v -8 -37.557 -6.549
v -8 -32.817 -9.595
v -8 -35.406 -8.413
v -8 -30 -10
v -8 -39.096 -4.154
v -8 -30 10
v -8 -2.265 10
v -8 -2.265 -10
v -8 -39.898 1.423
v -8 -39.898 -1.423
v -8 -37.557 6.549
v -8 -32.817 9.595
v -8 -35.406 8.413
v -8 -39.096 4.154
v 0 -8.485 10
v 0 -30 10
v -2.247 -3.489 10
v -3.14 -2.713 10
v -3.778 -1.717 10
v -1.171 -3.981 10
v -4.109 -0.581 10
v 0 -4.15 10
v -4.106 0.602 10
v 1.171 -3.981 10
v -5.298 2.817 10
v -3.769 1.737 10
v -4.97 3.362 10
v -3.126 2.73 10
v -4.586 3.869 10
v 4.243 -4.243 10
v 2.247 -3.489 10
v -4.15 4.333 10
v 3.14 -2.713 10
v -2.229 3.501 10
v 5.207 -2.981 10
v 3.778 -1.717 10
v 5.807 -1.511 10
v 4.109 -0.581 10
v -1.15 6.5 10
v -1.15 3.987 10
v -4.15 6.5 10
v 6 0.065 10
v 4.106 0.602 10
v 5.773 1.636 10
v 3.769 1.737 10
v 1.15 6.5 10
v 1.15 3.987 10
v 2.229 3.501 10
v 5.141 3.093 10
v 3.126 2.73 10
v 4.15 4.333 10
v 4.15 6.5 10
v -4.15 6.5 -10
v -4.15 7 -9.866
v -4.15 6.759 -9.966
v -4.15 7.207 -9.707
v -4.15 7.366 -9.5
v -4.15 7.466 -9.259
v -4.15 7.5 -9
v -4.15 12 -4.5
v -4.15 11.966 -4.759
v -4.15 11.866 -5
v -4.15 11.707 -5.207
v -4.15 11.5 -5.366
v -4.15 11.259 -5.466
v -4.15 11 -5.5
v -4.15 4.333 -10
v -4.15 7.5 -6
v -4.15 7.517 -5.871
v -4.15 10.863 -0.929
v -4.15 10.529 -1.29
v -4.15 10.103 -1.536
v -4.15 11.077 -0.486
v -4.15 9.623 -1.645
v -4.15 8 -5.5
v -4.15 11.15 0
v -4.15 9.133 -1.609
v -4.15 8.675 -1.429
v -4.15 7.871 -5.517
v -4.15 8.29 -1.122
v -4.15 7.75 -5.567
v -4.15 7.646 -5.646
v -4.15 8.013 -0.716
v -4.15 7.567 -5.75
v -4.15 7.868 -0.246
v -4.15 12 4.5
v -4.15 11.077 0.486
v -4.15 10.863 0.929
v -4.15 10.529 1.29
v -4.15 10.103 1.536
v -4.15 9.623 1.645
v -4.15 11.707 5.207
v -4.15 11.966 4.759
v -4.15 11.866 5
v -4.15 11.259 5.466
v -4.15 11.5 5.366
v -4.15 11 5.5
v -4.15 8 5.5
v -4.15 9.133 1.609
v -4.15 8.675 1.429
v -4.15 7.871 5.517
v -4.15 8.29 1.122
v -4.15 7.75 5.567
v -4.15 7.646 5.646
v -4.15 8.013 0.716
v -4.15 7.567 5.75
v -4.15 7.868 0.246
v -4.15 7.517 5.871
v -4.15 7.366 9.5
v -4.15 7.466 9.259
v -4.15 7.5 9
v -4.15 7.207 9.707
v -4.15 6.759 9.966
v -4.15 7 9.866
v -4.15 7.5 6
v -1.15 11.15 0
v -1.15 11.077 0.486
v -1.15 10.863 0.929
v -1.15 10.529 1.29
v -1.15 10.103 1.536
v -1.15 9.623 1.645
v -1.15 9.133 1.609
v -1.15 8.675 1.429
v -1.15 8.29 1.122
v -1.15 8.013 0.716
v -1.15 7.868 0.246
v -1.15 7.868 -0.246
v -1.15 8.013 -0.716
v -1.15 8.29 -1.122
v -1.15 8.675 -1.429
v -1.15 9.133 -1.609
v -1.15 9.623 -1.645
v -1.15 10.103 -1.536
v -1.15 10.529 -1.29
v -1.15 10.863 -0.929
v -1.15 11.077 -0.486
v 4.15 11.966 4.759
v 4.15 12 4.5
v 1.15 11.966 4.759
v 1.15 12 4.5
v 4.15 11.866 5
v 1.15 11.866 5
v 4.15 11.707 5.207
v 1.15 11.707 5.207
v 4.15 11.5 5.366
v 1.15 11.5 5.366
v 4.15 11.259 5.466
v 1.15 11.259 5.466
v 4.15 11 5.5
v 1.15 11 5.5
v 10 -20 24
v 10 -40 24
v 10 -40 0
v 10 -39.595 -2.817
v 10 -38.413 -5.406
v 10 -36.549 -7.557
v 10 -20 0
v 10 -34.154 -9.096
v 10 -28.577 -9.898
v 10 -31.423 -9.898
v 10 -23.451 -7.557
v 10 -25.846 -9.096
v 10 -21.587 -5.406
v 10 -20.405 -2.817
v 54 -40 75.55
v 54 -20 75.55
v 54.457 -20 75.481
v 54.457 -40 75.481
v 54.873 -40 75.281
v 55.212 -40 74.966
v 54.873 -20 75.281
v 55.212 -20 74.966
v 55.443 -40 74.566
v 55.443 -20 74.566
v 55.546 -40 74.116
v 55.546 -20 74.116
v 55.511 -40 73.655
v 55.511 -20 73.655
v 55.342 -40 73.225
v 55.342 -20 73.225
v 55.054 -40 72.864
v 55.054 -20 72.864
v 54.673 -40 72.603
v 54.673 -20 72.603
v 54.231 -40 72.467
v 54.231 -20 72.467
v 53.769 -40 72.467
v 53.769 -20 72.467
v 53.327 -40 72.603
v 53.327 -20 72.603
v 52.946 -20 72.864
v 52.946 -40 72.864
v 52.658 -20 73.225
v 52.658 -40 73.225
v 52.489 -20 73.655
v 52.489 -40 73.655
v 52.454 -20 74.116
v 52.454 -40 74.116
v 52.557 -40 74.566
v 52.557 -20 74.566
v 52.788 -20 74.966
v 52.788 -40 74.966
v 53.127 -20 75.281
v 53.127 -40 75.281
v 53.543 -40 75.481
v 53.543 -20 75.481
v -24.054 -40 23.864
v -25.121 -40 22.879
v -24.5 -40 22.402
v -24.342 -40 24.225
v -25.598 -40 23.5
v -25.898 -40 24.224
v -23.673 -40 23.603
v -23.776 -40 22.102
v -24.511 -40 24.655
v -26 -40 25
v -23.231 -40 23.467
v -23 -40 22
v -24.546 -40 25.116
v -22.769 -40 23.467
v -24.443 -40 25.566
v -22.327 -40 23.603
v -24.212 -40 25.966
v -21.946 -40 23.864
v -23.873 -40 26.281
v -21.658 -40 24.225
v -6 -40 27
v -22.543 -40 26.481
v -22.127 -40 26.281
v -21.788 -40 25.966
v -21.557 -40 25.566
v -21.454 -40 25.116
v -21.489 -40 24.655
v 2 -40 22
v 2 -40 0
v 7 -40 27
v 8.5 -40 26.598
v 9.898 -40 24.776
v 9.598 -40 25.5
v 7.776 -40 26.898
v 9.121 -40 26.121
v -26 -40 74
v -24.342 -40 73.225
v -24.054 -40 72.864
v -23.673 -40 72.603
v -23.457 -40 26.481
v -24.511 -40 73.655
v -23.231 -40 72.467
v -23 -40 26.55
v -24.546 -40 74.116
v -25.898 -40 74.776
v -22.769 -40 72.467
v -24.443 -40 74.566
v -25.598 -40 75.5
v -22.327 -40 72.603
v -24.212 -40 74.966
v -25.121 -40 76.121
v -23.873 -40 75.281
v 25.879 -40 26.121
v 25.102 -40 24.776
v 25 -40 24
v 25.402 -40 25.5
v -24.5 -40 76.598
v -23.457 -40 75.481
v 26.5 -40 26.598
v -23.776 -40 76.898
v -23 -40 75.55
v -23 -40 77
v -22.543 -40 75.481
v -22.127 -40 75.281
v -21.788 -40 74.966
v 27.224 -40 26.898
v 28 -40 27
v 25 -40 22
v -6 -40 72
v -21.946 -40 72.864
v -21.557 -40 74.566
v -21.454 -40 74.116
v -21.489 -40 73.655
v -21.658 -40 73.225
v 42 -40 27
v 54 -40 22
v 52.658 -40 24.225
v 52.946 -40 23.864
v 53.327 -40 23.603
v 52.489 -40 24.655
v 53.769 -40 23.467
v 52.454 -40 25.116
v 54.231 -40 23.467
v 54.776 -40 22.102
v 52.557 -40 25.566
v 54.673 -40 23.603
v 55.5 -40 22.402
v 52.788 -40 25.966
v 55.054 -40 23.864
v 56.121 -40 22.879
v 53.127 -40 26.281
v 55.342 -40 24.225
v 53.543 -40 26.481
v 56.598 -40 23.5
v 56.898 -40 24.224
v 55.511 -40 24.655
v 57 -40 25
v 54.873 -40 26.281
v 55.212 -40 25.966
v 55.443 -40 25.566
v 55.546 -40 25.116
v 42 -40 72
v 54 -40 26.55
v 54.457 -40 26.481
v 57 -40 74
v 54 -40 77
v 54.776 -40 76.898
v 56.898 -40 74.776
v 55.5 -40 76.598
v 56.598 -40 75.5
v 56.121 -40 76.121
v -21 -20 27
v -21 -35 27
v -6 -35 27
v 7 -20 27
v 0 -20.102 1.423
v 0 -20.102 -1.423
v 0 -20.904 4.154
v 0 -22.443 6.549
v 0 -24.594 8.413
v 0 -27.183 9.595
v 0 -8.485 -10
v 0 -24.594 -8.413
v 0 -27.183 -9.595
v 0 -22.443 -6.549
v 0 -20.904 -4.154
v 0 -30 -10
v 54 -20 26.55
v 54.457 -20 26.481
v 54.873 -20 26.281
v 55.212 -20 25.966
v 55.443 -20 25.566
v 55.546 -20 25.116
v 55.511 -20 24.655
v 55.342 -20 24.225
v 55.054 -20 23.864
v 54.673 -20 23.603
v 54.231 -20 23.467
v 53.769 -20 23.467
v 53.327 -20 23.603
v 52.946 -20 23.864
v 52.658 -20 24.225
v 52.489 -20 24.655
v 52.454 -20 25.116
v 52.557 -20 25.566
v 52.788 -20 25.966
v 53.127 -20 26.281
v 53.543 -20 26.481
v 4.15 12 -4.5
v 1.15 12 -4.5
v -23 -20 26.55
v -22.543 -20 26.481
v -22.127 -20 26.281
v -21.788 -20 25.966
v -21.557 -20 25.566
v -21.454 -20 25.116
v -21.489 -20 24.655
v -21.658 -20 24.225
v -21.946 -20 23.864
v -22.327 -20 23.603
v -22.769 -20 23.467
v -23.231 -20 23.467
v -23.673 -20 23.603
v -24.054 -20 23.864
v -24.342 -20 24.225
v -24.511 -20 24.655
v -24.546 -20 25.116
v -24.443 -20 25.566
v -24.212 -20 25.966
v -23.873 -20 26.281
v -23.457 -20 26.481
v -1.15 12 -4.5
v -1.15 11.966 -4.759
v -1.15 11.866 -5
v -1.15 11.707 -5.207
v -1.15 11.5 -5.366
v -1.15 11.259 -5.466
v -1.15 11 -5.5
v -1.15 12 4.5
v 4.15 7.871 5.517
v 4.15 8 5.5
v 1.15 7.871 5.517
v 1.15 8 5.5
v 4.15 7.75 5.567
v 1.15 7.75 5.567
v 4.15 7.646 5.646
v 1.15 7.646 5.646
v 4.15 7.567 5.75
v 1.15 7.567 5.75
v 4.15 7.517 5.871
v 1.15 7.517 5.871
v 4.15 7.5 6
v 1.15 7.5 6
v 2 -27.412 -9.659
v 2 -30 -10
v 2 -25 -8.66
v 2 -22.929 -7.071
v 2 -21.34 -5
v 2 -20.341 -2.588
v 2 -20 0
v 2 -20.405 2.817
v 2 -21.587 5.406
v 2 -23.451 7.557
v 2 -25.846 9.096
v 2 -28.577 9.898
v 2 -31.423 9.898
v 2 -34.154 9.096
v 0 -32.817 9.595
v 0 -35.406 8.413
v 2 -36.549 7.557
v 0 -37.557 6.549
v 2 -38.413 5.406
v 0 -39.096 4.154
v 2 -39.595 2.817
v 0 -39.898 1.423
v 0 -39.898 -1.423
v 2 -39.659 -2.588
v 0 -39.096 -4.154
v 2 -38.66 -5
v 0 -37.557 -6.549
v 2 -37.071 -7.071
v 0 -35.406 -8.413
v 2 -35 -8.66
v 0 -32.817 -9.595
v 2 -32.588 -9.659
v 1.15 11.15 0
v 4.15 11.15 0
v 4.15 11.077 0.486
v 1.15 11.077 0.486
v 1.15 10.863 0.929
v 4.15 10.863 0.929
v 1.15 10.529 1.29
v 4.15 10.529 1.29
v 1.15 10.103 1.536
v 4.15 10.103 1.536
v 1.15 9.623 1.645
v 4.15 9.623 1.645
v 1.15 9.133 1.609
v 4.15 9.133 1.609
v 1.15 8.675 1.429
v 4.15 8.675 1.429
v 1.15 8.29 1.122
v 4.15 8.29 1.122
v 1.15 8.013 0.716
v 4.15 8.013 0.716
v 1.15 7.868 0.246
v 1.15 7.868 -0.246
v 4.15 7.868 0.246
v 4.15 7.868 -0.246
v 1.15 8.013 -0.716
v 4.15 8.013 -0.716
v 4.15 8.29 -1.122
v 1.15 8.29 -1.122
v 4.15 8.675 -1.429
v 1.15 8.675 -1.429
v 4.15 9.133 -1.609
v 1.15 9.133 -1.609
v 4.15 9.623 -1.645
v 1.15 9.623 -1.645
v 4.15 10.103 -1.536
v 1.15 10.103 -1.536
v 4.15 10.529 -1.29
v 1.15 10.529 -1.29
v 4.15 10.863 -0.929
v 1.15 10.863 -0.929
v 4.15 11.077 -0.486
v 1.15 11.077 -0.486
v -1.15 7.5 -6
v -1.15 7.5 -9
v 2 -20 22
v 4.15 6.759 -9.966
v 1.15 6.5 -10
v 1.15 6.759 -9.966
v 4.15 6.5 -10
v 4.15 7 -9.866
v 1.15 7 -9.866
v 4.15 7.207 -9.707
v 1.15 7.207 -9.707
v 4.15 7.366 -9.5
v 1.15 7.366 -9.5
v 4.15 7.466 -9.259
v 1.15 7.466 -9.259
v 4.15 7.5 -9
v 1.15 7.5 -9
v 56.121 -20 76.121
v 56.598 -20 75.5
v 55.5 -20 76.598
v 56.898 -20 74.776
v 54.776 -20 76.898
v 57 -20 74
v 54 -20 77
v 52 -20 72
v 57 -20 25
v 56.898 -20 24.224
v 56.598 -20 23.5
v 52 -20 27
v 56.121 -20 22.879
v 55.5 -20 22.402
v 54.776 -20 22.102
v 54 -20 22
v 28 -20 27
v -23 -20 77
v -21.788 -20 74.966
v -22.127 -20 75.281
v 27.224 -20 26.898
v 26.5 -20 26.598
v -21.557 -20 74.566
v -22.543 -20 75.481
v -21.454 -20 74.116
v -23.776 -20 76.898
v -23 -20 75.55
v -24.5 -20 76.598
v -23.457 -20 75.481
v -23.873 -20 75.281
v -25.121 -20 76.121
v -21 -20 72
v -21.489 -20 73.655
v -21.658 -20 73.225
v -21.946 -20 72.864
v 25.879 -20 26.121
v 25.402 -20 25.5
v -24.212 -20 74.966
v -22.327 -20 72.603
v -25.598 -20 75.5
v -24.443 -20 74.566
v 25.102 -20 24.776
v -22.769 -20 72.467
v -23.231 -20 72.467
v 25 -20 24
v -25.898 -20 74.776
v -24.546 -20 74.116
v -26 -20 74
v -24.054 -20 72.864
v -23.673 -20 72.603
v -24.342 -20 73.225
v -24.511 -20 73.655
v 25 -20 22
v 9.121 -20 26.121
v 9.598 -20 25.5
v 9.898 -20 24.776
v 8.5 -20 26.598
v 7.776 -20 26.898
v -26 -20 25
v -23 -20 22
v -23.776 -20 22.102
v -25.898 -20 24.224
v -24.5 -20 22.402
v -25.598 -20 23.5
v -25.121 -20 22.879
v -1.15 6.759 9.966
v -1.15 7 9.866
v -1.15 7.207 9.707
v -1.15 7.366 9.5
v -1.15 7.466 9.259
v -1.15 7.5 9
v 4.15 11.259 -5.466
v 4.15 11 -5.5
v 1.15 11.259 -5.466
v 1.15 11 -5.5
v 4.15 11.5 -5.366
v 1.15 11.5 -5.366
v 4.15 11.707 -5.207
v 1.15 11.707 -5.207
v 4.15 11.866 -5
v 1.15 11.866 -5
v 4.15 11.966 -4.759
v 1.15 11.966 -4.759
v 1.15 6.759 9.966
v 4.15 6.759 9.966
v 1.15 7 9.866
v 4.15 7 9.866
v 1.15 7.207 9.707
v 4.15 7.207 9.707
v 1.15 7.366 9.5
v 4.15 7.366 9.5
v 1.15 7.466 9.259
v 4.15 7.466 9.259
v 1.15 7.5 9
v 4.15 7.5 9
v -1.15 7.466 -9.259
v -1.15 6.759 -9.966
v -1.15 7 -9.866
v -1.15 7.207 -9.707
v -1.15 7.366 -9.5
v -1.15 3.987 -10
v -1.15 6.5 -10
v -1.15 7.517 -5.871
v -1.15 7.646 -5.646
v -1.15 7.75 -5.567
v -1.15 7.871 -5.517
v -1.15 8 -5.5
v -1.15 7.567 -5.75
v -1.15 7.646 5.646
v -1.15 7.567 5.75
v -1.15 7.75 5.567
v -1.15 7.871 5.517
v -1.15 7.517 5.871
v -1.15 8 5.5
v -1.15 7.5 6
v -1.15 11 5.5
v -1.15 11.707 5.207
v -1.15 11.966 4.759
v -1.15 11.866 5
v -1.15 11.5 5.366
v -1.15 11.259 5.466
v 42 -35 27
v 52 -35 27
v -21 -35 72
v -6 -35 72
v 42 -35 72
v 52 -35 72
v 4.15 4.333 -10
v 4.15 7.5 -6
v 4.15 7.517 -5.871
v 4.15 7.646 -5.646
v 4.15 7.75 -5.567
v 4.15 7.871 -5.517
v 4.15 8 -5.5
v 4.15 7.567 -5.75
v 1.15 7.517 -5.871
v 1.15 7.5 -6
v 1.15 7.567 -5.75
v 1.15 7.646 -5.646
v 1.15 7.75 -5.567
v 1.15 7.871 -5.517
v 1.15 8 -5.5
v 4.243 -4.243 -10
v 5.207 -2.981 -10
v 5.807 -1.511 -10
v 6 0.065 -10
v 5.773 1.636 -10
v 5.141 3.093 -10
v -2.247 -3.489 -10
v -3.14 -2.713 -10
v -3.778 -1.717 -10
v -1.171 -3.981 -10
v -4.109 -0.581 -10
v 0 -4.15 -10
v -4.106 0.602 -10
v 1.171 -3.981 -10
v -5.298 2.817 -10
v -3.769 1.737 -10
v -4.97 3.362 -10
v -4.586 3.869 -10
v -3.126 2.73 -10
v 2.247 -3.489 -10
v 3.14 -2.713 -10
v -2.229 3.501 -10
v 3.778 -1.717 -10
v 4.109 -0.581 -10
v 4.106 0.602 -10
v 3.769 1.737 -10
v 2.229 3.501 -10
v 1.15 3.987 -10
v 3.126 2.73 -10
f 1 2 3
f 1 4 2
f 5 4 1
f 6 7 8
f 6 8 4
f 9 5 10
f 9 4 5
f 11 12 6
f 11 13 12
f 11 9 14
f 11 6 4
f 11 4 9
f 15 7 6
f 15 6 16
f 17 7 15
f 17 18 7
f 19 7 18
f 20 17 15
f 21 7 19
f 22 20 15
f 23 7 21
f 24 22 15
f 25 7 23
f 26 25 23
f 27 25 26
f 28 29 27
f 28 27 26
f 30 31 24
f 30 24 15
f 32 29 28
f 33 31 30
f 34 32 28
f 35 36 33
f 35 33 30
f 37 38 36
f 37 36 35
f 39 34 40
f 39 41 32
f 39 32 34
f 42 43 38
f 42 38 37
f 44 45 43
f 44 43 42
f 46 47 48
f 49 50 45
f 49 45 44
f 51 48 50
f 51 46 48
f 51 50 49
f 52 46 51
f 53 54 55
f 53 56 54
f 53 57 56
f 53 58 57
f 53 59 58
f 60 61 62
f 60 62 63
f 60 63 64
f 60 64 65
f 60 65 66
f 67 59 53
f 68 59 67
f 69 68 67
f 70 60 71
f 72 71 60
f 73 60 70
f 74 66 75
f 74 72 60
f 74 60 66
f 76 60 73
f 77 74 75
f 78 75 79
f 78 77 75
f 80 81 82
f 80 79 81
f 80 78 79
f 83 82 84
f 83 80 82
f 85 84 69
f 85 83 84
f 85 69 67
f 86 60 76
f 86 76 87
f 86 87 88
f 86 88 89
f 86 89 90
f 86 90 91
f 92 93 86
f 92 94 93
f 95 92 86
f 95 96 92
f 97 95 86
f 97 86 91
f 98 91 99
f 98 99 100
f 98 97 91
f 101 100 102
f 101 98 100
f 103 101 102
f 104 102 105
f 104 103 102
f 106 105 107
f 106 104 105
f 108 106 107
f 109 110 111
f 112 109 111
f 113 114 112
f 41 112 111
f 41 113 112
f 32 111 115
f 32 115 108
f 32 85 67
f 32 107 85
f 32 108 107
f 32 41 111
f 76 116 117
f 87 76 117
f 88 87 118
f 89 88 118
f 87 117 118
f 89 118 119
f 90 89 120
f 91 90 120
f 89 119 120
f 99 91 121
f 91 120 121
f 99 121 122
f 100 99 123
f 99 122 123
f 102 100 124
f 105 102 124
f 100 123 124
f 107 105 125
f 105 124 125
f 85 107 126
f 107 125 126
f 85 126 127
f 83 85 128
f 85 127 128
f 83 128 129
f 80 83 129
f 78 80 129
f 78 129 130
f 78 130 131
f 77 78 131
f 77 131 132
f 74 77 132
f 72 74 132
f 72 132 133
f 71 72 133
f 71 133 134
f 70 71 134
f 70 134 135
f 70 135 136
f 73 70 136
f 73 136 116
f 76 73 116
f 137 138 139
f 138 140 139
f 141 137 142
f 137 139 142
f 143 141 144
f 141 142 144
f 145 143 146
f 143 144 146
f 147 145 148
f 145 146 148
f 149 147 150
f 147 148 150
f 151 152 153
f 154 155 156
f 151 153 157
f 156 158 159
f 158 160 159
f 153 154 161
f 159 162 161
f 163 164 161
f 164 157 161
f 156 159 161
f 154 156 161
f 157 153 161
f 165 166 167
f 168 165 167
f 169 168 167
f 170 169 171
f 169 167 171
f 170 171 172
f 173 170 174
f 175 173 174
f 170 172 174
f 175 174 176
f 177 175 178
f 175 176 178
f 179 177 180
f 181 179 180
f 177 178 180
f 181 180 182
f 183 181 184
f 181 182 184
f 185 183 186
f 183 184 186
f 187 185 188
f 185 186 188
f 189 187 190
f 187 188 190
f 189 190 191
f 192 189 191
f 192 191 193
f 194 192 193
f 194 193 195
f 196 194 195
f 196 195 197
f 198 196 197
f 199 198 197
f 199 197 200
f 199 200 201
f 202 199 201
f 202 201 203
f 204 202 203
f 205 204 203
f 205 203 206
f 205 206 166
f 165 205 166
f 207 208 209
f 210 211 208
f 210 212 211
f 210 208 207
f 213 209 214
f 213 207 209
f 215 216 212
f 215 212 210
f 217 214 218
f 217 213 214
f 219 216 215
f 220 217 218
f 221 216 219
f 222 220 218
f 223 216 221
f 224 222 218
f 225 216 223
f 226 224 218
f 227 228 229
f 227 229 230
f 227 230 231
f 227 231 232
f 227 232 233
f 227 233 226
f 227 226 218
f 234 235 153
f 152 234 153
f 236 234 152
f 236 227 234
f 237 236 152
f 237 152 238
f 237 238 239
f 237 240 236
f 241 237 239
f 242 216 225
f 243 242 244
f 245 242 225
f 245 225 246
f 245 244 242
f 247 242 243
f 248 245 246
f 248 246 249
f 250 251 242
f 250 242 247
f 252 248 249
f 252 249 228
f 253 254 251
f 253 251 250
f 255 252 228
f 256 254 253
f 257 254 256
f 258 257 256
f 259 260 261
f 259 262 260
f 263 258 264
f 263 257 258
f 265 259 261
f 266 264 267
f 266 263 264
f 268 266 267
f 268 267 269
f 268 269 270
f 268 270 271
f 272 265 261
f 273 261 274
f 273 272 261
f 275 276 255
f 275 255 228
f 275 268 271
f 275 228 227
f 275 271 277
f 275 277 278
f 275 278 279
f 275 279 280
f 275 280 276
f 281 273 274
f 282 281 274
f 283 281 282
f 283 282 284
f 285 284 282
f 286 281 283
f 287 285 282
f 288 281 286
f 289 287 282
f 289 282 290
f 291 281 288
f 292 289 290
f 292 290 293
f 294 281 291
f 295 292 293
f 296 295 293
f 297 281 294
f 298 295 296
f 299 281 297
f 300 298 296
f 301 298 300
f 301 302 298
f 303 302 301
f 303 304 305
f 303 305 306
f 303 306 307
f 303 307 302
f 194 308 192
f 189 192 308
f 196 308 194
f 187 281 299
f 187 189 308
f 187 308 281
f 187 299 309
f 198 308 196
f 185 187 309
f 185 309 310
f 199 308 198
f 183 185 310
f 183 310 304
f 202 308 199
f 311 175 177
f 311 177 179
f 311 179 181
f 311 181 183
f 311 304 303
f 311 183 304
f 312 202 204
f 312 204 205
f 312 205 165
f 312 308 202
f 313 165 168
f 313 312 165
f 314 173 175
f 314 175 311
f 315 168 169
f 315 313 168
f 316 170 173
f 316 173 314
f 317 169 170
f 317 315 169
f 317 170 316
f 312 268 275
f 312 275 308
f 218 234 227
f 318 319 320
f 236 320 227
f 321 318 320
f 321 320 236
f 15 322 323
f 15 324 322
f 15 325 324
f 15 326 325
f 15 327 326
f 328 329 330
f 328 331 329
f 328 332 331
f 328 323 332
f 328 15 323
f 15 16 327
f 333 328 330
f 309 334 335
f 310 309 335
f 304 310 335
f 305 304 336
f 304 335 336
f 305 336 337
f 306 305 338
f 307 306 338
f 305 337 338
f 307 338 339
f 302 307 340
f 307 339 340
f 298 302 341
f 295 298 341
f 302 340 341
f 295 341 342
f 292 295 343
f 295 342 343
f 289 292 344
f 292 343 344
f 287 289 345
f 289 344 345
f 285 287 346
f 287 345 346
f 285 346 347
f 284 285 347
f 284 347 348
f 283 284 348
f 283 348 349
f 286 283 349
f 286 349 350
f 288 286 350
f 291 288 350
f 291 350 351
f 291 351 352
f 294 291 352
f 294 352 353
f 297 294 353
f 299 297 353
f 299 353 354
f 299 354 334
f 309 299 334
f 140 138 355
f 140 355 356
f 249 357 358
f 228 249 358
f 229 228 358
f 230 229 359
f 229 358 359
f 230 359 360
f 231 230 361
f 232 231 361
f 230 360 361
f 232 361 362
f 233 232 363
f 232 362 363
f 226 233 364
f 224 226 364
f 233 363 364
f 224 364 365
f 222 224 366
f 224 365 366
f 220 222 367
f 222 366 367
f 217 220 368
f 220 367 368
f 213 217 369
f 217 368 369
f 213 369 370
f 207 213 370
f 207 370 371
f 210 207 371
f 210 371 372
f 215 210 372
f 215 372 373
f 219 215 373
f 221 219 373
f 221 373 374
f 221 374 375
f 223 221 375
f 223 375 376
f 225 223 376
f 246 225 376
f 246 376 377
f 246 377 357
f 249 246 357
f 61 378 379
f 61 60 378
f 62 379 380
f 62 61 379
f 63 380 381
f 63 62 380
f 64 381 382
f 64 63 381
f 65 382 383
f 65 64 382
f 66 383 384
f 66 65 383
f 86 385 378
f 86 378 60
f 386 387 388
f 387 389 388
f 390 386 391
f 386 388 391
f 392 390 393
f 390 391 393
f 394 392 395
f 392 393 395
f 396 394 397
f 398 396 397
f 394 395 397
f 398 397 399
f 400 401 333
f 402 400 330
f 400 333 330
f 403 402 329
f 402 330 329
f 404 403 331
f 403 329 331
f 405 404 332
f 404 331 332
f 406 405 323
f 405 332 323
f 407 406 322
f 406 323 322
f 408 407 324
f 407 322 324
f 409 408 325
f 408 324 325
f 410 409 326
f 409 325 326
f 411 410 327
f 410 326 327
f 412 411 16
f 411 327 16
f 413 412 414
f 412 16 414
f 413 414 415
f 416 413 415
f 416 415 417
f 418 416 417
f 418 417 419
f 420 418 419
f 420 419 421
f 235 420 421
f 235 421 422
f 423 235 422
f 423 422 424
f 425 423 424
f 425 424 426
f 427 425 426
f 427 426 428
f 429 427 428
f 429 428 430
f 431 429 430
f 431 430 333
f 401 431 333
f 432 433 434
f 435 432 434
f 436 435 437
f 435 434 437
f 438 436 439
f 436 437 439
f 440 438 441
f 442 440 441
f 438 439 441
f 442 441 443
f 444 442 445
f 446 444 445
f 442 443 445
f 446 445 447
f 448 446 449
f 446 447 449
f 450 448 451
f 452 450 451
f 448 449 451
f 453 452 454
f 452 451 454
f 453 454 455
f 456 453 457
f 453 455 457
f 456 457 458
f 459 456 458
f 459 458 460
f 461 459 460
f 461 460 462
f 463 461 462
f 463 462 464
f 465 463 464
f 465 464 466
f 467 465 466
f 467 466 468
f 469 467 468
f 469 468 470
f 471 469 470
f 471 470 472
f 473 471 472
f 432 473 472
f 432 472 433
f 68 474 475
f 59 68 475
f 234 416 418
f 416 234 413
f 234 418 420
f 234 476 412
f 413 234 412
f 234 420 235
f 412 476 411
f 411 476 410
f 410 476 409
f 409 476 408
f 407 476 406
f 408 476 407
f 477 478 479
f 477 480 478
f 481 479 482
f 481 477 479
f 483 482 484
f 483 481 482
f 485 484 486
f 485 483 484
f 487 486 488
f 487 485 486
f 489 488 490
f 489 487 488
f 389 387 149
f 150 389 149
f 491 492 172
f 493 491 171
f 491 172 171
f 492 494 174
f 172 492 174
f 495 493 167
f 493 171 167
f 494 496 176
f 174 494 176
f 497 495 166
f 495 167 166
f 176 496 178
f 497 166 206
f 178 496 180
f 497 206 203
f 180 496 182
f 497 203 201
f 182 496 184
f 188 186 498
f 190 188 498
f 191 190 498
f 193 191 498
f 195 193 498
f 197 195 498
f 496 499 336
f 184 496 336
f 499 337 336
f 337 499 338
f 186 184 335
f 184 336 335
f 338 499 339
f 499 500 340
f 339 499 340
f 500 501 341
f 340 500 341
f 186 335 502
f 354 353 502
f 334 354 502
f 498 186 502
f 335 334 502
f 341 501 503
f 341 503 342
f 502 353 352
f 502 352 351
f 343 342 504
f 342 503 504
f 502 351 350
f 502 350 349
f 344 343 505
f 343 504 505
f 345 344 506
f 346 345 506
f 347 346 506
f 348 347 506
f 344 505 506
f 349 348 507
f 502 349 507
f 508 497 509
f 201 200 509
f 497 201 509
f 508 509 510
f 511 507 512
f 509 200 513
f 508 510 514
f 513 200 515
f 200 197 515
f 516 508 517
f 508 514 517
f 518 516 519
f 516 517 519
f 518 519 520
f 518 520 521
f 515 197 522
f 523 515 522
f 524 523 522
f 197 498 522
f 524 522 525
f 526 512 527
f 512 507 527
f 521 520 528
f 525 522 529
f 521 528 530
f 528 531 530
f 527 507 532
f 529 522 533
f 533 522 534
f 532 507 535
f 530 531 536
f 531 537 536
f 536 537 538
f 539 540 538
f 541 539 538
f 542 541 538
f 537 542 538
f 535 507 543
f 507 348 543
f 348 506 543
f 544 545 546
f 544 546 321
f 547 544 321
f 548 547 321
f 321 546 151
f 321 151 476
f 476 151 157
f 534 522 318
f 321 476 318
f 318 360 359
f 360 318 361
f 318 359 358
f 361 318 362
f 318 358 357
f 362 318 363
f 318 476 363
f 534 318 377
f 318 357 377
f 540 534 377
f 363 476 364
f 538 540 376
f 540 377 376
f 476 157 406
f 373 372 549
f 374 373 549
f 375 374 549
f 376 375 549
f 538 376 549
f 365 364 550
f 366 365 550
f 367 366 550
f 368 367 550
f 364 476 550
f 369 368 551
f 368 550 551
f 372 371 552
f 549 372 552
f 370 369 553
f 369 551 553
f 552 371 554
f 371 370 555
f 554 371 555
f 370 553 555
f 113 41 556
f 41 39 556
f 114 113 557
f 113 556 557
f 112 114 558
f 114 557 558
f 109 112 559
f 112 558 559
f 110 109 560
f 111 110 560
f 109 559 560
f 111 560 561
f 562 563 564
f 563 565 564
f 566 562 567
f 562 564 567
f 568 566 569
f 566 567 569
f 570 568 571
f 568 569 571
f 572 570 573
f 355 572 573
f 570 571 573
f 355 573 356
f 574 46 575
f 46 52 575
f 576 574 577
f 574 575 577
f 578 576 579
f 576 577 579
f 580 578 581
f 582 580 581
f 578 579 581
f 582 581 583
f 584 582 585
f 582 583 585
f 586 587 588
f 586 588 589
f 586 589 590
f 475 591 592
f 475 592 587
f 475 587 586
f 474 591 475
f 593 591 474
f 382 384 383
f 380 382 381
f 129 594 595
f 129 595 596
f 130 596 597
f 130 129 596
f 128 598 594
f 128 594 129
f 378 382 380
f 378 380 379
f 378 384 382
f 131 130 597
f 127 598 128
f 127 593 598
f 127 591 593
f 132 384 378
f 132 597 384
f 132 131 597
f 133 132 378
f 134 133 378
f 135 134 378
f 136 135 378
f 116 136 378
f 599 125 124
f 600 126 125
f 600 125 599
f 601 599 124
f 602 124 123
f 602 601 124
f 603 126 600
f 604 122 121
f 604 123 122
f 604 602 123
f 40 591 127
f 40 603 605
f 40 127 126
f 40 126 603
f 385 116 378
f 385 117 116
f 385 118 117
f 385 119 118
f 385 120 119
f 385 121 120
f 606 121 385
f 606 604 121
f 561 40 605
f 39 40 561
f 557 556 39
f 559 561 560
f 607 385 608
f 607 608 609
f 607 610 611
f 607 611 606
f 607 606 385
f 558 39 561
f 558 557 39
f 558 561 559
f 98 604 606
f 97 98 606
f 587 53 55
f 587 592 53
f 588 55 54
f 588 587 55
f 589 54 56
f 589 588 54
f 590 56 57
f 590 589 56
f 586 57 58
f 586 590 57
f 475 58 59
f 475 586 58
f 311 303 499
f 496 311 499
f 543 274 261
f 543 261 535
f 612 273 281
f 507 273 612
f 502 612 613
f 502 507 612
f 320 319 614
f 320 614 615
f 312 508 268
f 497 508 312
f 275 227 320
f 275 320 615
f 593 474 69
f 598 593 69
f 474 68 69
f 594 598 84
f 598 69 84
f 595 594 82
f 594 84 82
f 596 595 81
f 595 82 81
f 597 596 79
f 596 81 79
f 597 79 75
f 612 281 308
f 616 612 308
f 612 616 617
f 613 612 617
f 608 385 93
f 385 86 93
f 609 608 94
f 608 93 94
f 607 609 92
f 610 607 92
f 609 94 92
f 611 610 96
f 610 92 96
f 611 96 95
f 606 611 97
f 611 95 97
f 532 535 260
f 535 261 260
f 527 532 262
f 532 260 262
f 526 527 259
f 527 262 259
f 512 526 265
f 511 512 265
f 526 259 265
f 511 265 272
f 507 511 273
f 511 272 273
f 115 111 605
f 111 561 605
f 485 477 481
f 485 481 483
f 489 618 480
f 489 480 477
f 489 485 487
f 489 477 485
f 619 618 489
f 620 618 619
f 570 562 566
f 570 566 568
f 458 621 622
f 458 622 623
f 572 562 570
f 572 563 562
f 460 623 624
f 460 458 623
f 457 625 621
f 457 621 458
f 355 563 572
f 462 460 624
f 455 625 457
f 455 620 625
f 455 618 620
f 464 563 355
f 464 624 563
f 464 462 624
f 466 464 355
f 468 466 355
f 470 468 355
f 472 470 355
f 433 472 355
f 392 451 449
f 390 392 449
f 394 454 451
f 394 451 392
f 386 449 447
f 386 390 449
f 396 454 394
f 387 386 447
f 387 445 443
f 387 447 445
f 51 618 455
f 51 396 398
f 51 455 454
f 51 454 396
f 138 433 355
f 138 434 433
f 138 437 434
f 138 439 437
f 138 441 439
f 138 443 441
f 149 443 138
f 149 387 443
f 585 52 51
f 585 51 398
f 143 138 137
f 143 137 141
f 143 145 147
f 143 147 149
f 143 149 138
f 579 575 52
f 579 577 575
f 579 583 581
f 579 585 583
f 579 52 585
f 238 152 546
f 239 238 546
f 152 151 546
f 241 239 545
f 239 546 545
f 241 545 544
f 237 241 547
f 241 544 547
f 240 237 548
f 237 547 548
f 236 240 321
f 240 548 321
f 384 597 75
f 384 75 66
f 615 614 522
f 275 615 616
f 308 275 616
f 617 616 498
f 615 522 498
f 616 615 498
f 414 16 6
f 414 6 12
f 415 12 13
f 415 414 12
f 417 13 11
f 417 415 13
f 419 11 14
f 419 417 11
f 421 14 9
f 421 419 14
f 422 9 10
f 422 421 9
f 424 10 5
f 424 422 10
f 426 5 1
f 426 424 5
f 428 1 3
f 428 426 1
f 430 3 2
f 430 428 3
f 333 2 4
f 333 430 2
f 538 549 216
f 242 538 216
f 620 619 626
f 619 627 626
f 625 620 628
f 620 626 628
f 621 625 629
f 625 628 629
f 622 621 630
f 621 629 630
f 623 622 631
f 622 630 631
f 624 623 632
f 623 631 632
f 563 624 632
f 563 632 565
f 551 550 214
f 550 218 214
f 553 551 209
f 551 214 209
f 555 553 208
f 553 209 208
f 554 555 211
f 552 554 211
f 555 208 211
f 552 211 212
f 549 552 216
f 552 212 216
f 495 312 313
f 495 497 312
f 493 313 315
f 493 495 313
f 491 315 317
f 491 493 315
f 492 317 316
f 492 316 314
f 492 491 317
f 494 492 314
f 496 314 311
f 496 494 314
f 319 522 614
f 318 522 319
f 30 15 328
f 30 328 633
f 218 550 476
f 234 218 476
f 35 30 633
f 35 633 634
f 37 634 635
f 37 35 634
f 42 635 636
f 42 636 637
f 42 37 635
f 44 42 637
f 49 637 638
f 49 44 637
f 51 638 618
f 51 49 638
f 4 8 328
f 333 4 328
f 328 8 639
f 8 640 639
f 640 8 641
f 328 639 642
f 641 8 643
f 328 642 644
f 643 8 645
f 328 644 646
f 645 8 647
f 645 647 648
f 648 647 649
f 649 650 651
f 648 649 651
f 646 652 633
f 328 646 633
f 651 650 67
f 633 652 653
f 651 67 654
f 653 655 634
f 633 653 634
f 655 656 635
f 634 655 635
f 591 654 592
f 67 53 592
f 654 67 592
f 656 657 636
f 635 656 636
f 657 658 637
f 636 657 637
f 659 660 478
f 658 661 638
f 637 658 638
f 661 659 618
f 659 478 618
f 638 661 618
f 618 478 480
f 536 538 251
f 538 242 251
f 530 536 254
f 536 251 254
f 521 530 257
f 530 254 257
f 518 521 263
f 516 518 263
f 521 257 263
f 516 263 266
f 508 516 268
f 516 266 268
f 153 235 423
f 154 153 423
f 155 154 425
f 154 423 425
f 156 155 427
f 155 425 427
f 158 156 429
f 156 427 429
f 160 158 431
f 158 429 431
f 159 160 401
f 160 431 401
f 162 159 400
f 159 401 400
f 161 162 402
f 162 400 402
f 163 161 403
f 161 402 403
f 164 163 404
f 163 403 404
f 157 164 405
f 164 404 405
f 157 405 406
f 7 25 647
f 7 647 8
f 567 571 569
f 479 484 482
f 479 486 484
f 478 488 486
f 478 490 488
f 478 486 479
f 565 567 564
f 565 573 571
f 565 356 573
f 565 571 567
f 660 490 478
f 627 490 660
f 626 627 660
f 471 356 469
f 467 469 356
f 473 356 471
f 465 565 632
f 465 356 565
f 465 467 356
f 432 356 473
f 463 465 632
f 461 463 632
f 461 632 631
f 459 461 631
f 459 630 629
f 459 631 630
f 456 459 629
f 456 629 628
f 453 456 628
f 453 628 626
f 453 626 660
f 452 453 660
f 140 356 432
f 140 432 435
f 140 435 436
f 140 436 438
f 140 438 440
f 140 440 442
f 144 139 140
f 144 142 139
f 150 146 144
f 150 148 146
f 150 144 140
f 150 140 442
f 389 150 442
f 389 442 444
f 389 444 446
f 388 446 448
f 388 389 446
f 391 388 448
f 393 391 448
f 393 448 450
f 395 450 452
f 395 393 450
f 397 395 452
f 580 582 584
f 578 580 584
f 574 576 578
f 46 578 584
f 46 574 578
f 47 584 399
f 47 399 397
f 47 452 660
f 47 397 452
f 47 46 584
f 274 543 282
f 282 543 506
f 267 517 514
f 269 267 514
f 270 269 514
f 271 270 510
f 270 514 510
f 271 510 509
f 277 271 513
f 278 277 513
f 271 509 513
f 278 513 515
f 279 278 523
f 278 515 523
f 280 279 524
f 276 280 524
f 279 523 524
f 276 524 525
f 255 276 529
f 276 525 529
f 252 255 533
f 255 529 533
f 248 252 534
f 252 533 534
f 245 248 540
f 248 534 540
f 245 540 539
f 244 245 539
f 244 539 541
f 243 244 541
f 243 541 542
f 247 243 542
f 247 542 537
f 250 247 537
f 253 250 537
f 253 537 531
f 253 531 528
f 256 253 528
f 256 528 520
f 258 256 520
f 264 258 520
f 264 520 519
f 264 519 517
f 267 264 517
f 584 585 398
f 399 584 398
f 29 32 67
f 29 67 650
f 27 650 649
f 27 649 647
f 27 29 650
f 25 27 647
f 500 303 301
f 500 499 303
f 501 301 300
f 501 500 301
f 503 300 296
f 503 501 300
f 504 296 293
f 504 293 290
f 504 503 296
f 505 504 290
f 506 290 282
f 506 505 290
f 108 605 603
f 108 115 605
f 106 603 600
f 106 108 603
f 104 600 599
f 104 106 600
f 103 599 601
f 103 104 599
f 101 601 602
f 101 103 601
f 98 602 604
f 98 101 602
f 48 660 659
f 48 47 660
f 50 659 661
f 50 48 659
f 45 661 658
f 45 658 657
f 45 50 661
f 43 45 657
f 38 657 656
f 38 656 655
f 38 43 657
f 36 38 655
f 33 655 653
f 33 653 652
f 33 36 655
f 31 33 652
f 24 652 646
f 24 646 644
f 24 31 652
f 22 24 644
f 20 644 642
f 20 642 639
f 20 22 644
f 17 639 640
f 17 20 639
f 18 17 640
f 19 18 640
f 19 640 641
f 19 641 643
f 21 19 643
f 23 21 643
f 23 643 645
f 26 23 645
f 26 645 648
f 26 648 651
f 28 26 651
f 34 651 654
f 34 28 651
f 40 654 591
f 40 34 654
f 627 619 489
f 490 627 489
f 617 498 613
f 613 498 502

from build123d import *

# Parameters (mm, degrees)
EXTRUDE_1_DEPTH             = 10
EXTRUDE_2_REACH             = 34.619
SKETCH_2_R                  = 10
EXTRUDE_2_DIRECTION_2_DEPTH = 2
SKETCH_6_R                  = 1.65
SKETCH_6_W                  = 14.704506527
SKETCH_6_H                  = 8.520368268
CUT_EXTRUDE_2_DEPTH         = 43.983979574
FILLET_1_R                  = 1
FILLET_2_R                  = 0.5
EXTRUDE_3_DEPTH             = 8
EXTRUDE_4_DEPTH             = 55
SKETCH_9_W                  = 73
SKETCH_9_H                  = 45
CUT_EXTRUDE_3_DEPTH         = 13
SKETCH_10_W                 = 15
SKETCH_10_H                 = 20
CUT_EXTRUDE_4_DEPTH         = 13
SKETCH_11_W                 = 73
SKETCH_11_H                 = 45
CUT_EXTRUDE_6_DEPTH         = 13
SKETCH_12_W                 = 15
SKETCH_12_H                 = 45
SKETCH_12_W_2               = 10
EXTRUDE_5_DEPTH             = 5
FILLET_3_R                  = 3
SKETCH_14_R                 = 1.55
CUT_EXTRUDE_7_DEPTH         = 102.004950374


with BuildPart() as part:
    # 草图1 → 凸台-拉伸1 (new, symmetric)
    with BuildSketch(Plane.XY):
        with BuildLine():
            Line((-1.15, 3.987480407), (-1.15, 12))
            Line((-1.15, 12), (-4.15, 12))
            Line((-4.15, 12), (-4.15, 4.333301282))
            ThreePointArc((-4.15, 4.333301282), (-4.784308974, 3.620826928), (-5.297685557, 2.816829377))
            Line((-5.297685557, 2.816829377), (-8, -2.265484914))
            Line((-8, -2.265484914), (-8, -30))
            Line((-8, -30), (0, -30))
            Line((0, -30), (0, -8.485281374))
            Line((0, -8.485281374), (4.242640687, -4.242640687))
            ThreePointArc((4.242640687, -4.242640687), (5.999649956, 0.064810571), (4.15, 4.333301282))
            Line((4.15, 4.333301282), (4.15, 12))
            Line((4.15, 12), (1.15, 12))
            Line((1.15, 12), (1.15, 3.987480407))
            ThreePointArc((1.15, 3.987480407), (0, -4.15), (-1.15, 3.987480407))
        make_face()
    extrude(amount=EXTRUDE_1_DEPTH, both=True)

    # 凸台-拉伸2: up to this face of the body (flat: up to its plane)
    extrude_2_end = Plane(part.part.faces().sort_by_distance((-8, -16.132742457, 0))[0])
    # 草图2 → 凸台-拉伸2 (add, up to the picked face)
    with BuildSketch(Plane(origin=(0, 0, 0), x_dir=(0, 0, -1), z_dir=(1, 0, 0)), mode=Mode.PRIVATE) as extrude_2_sk1:
        with Locations((0, -30)):
            Circle(SKETCH_2_R)
    extrude_2_tool1 = split(extrude(extrude_2_sk1.sketch, amount=-EXTRUDE_2_REACH, mode=Mode.PRIVATE), bisect_by=extrude_2_end, keep=Keep.BOTH, mode=Mode.PRIVATE)
    add(extrude_2_tool1.solids().sort_by(Axis((0, -30, 0), (-1, 0, 0)))[0])

    # 草图2 → 凸台-拉伸2 direction 2 (add)
    with BuildSketch(Plane(origin=(0, 0, 0), x_dir=(0, 0, -1), z_dir=(1, 0, 0))):
        with Locations((0, -30)):
            Circle(SKETCH_2_R)
    extrude(amount=EXTRUDE_2_DIRECTION_2_DEPTH)

    # 草图6 → 切除-拉伸2 (cut, through all)
    with BuildSketch(Plane(origin=(4.15, 0, 0), x_dir=(0, 0, -1), z_dir=(1, 0, 0))):
        with Locations(Location((0, 9.5, 0), (0, 0, 90))):
            Circle(SKETCH_6_R)
        with Locations((-12.852253263, 11.760184134)):
            Rectangle(SKETCH_6_W, SKETCH_6_H)
        with Locations((12.852253263, 11.760184134)):
            Rectangle(SKETCH_6_W, SKETCH_6_H)
    extrude(amount=-CUT_EXTRUDE_2_DEPTH, mode=Mode.SUBTRACT)

    # 圆角1
    fillet_1_edges = [part.edges().sort_by_distance(p)[0] for p in [
        (2.65, 7.5, -10),
        (-2.65, 7.5, -10),
        (2.65, 7.5, 10),
        (-2.65, 7.5, 10),
        (2.65, 12, 5.5),
        (-2.65, 12, 5.5),
        (2.65, 12, -5.5),
        (-2.65, 12, -5.5),
    ]]
    fillet(fillet_1_edges, radius=FILLET_1_R)

    # 圆角2
    fillet_2_edges = [part.edges().sort_by_distance(p)[0] for p in [
        (-2.65, 7.5, 5.5),
        (2.65, 7.5, 5.5),
        (2.65, 7.5, -5.5),
        (-2.65, 7.5, -5.5),
    ]]
    fillet(fillet_2_edges, radius=FILLET_2_R)

    # 草图7 → 凸台-拉伸3 (add)
    with BuildSketch(Plane(origin=(2, 0, 0), x_dir=(0, 0, -1), z_dir=(1, 0, 0))):
        with BuildLine():
            Line((0, -20), (-22, -20))
            Line((-22, -20), (-22, -40))
            Line((-22, -40), (0, -40))
            ThreePointArc((0, -40), (10, -30), (0, -20))
        make_face()
    extrude(amount=EXTRUDE_3_DEPTH)

    # 草图8 → 凸台-拉伸4 (add)
    with BuildSketch(Plane.XY.offset(22)):
        Polygon((10, -20), (-26, -20), (-26, -40), (2, -40), (57, -40), (57, -20), align=None)
    extrude(amount=EXTRUDE_4_DEPTH)

    # 草图9 → 切除-拉伸3 (cut)
    with BuildSketch(Plane(origin=(0, -20, 0), x_dir=(1, 0, 0), z_dir=(0, 1, 0))):
        with Locations((15.5, -49.5)):
            Rectangle(SKETCH_9_W, SKETCH_9_H)
    extrude(amount=-CUT_EXTRUDE_3_DEPTH, mode=Mode.SUBTRACT)

    # 草图10 → 切除-拉伸4 (cut)
    with BuildSketch(Plane(origin=(0, 0, 22), x_dir=(-1, 0, 0), z_dir=(0, 0, -1))):
        with Locations((-17.5, -30)):
            Rectangle(SKETCH_10_W, SKETCH_10_H)
    extrude(amount=-CUT_EXTRUDE_4_DEPTH, mode=Mode.SUBTRACT)

    # 草图11 → 切除-拉伸6 (cut)
    with BuildSketch(Plane(origin=(0, -33, 0), x_dir=(1, 0, 0), z_dir=(0, 1, 0))):
        with Locations((15.5, -49.5)):
            Rectangle(SKETCH_11_W, SKETCH_11_H)
    extrude(amount=-CUT_EXTRUDE_6_DEPTH, mode=Mode.SUBTRACT)

    # 草图12 → 凸台-拉伸5 (add)
    with BuildSketch(Plane.XZ.offset(40)):
        with Locations((-13.5, 49.5)):
            Rectangle(SKETCH_12_W, SKETCH_12_H)
        with Locations((47, 49.5)):
            Rectangle(SKETCH_12_W_2, SKETCH_12_H)
    extrude(amount=-EXTRUDE_5_DEPTH)

    # 圆角3
    fillet_3_edges = [part.edges().sort_by_distance(p)[0] for p in [
        (-26, -30, 22),
        (57, -30, 22),
        (-26, -30, 77),
        (57, -30, 77),
        (10, -30, 27),
        (25, -30, 27),
    ]]
    fillet(fillet_3_edges, radius=FILLET_3_R)

    # 草图14 → 切除-拉伸7 (cut, through all)
    with BuildSketch(Plane(origin=(0, -20, 0), x_dir=(1, 0, 0), z_dir=(0, 1, 0))):
        with Locations(Location((-23, -25, 0), (0, 0, 270))):
            Circle(SKETCH_14_R)
        with Locations(Location((54, -25, 0), (0, 0, 270))):
            Circle(SKETCH_14_R)
        with Locations(Location((-23, -74, 0), (0, 0, 270))):
            Circle(SKETCH_14_R)
        with Locations(Location((54, -74, 0), (0, 0, 270))):
            Circle(SKETCH_14_R)
    extrude(amount=-CUT_EXTRUDE_7_DEPTH, mode=Mode.SUBTRACT)


solid = part.part
